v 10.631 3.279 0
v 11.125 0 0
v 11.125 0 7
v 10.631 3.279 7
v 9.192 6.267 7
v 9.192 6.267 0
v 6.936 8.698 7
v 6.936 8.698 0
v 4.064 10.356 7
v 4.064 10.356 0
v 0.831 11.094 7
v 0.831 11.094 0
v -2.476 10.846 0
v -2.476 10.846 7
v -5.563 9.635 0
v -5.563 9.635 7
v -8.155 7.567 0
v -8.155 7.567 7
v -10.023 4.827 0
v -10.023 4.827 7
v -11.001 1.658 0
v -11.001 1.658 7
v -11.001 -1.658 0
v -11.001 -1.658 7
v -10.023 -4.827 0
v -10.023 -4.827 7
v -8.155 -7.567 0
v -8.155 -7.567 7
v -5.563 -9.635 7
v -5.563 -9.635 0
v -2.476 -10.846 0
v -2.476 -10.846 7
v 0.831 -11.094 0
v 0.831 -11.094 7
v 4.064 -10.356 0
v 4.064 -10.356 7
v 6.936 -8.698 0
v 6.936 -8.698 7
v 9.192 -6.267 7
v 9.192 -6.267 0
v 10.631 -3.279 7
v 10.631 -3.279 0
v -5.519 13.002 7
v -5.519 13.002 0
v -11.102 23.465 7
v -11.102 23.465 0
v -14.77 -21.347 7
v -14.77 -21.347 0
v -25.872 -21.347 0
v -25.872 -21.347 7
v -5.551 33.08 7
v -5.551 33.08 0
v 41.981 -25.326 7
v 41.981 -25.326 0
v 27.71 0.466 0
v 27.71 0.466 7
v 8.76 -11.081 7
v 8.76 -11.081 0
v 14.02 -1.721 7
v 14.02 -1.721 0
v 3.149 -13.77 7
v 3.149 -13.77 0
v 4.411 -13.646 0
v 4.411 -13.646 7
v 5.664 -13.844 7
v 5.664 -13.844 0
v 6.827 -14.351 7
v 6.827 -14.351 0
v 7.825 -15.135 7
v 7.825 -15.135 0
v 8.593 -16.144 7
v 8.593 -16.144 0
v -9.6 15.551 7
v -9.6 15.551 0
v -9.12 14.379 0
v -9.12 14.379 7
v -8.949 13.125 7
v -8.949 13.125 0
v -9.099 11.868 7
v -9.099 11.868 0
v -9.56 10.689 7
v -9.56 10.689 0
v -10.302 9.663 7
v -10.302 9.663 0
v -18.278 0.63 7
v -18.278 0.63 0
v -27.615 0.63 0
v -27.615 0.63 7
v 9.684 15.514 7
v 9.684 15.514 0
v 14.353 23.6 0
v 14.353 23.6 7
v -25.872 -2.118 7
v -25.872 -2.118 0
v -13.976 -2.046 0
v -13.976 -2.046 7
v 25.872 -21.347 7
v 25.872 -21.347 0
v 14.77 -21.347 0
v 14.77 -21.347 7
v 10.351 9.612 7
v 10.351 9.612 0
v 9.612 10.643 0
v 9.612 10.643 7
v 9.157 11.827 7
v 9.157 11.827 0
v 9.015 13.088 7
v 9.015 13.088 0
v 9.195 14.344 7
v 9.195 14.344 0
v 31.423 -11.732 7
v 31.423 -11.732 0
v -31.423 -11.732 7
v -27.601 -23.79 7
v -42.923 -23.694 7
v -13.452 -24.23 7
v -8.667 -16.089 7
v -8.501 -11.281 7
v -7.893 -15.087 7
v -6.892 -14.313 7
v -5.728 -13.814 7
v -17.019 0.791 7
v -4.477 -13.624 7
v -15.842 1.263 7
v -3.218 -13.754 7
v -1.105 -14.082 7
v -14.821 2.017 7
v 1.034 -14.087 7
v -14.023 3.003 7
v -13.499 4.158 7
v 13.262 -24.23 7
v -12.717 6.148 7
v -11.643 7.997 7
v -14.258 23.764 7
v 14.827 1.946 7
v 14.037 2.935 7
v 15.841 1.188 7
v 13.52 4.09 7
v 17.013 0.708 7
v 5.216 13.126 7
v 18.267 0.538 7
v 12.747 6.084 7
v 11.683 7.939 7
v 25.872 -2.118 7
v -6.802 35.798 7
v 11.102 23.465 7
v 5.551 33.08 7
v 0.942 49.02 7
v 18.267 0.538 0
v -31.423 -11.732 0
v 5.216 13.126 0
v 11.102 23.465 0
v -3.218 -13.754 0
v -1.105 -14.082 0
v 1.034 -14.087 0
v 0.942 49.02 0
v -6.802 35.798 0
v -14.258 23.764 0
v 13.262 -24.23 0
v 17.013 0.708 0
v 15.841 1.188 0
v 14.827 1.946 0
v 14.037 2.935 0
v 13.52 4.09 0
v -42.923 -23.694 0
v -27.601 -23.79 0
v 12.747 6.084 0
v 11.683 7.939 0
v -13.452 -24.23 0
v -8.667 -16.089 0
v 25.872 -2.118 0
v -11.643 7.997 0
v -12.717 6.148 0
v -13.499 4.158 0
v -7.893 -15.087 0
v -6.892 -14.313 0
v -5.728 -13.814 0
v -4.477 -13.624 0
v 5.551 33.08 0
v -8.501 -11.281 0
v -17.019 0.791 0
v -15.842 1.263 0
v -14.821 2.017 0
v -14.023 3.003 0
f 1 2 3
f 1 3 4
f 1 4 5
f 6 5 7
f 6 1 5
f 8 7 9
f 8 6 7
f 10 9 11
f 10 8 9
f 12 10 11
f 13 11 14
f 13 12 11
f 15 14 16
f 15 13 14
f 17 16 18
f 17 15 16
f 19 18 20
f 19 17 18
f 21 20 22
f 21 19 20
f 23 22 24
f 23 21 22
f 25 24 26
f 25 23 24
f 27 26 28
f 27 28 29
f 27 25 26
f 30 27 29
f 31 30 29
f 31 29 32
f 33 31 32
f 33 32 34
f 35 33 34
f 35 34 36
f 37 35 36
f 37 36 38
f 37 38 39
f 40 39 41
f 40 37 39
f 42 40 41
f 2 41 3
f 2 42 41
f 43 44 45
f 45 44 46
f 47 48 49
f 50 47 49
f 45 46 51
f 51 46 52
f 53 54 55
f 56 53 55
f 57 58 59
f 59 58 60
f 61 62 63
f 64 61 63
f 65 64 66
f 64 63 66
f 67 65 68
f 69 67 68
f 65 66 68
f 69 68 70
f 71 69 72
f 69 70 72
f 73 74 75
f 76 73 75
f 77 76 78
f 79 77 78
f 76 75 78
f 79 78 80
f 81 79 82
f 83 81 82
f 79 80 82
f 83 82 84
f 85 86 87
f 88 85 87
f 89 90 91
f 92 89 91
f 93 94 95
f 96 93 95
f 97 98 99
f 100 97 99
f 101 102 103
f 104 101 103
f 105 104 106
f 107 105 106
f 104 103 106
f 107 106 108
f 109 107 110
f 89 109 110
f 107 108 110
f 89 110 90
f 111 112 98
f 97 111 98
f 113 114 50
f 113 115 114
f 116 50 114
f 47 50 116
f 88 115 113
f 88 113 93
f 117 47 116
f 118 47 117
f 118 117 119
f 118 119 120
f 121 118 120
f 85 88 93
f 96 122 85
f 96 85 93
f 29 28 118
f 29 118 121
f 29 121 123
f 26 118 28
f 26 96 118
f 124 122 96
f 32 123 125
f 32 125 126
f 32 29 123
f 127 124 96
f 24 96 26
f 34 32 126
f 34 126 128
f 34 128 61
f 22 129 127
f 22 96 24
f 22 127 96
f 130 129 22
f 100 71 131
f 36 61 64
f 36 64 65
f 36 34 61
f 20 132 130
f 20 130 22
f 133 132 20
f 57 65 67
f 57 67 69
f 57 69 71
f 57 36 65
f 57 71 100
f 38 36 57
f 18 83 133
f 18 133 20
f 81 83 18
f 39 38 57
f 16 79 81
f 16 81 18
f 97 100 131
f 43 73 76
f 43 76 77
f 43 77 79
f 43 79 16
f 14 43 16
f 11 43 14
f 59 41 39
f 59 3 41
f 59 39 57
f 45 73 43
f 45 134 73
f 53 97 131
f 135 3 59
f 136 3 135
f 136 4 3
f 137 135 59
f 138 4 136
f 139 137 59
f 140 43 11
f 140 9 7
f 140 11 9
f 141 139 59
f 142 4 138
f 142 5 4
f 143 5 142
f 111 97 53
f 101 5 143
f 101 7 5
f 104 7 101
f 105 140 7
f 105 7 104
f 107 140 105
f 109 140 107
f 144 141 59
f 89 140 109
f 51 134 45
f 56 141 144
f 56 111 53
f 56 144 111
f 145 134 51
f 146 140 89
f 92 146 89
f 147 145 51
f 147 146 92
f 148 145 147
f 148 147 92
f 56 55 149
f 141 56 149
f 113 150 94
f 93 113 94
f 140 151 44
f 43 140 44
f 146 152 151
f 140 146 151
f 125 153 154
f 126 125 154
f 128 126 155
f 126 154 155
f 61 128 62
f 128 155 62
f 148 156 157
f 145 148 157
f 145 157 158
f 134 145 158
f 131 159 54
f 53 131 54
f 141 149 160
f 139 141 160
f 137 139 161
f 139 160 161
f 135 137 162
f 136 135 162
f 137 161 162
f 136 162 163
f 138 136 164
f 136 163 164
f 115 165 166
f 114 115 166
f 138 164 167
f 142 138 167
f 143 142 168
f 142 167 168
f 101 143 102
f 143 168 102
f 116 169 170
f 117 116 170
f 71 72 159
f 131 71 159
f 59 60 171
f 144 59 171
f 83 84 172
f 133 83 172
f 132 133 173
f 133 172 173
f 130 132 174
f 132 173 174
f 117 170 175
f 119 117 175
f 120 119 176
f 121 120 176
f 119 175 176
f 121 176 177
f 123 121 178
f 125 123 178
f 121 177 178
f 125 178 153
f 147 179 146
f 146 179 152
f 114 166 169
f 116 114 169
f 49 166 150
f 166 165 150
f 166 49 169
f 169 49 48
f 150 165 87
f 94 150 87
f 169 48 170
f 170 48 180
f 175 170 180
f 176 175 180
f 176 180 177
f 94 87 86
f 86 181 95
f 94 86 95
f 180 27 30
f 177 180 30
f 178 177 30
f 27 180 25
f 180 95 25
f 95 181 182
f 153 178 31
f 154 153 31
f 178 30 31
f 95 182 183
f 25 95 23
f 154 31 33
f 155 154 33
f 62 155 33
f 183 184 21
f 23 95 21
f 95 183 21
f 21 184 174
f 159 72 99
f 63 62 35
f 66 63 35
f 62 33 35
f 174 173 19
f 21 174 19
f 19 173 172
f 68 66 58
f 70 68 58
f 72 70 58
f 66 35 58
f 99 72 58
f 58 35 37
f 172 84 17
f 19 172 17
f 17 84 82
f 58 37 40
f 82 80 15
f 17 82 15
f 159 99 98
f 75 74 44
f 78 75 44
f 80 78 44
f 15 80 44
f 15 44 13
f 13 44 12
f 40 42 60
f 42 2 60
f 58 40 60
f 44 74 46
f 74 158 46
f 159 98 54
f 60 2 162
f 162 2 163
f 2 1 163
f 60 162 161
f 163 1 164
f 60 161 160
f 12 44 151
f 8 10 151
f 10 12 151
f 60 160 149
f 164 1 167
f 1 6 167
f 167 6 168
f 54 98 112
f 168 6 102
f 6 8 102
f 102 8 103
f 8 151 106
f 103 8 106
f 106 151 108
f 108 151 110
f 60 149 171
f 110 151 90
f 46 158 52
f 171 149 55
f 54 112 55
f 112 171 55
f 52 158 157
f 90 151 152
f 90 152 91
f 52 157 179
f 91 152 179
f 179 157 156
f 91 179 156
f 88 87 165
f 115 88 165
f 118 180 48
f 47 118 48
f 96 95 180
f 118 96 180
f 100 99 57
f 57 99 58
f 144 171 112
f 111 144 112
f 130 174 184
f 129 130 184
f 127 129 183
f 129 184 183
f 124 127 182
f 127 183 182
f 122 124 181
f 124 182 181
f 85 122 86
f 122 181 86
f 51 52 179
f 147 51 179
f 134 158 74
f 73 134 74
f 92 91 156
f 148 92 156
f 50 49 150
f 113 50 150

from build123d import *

# Parameters (mm, degrees)
F0_R     = 11.125
F1_DEPTH = 7
F2_DEPTH = 7
F3_DEPTH = 7


with BuildPart() as f1:
    # F0 (on Top) → F1 (new body)
    with BuildSketch(Plane.XY):
        with BuildLine():
            Line((14.352928, 23.6), (0.942339, 49.019534))
            Line((0.942339, 49.019534), (-6.80188, 35.797903))
            Line((-6.80188, 35.797903), (-14.258011, 23.764401))
            Line((-14.258011, 23.764401), (-9.599727, 15.550613))
            ThreePointArc((-9.599727, 15.550613), (-8.984191, 12.491637), (-10.302184, 9.663366))
            ThreePointArc((-10.302184, 9.663366), (-12.214839, 7.093189), (-13.499103, 4.158105))
            ThreePointArc((-13.499103, 4.158105), (-15.307655, 1.607595), (-18.277547, 0.63))
            Line((-18.277547, 0.63), (-27.614663, 0.63))
            Line((-27.614663, 0.63), (-42.923331, -23.693677))
            Line((-42.923331, -23.693677), (-27.600953, -23.789553))
            Line((-27.600953, -23.789553), (-13.45157, -24.23))
            Line((-13.45157, -24.23), (-8.667362, -16.088915))
            ThreePointArc((-8.667362, -16.088915), (-6.325979, -14.026356), (-3.217628, -13.753636))
            ThreePointArc((-3.217628, -13.753636), (-0.035463, -14.124955), (3.148527, -13.769619))
            ThreePointArc((3.148527, -13.769619), (6.261609, -14.060615), (8.593178, -16.14382))
            Line((8.593178, -16.14382), (13.261736, -24.23))
            Line((13.261736, -24.23), (41.980992, -25.325857))
            Line((41.980992, -25.325857), (27.70958, 0.465599))
            Line((27.70958, 0.465599), (18.26709, 0.538301))
            ThreePointArc((18.26709, 0.538301), (15.31017, 1.534719), (13.519812, 4.09027))
            ThreePointArc((13.519812, 4.09027), (12.250302, 7.031766), (10.350576, 9.611514))
            ThreePointArc((10.350576, 9.611514), (9.046046, 12.45302), (9.68437, 15.51382))
            Line((9.68437, 15.51382), (14.352928, 23.6))
        make_face()
        Polygon((-31.423317, -11.732377), (-25.872195, -2.117552), (-13.976091, -2.045608), (-8.500632, -11.280731), (-14.769951, -21.347202), (-25.872195, -21.347202), align=None, mode=Mode.SUBTRACT)
        Polygon((25.872195, -21.347202), (14.769951, -21.347202), (8.759594, -11.080845), (14.019715, -1.721397), (25.872195, -2.117552), (31.423317, -11.732377), align=None, mode=Mode.SUBTRACT)
        Circle(F0_R, mode=Mode.SUBTRACT)
        Polygon((-11.102244, 23.464754), (-5.551122, 33.079579), (5.551122, 33.079579), (11.102244, 23.464754), (5.216496, 13.126454), (-5.519084, 13.002128), align=None, mode=Mode.SUBTRACT)
    extrude(amount=F1_DEPTH)

    # F0 (on Top) → F2 (join)
    with BuildSketch(Plane.XY):
        with BuildLine():
            Line((14.352928, 23.6), (0.942339, 49.019534))
            Line((0.942339, 49.019534), (-6.80188, 35.797903))
            Line((-6.80188, 35.797903), (-14.258011, 23.764401))
            Line((-14.258011, 23.764401), (-9.599727, 15.550613))
            ThreePointArc((-9.599727, 15.550613), (-8.984191, 12.491637), (-10.302184, 9.663366))
            ThreePointArc((-10.302184, 9.663366), (-12.214839, 7.093189), (-13.499103, 4.158105))
            ThreePointArc((-13.499103, 4.158105), (-15.307655, 1.607595), (-18.277547, 0.63))
            Line((-18.277547, 0.63), (-27.614663, 0.63))
            Line((-27.614663, 0.63), (-42.923331, -23.693677))
            Line((-42.923331, -23.693677), (-27.600953, -23.789553))
            Line((-27.600953, -23.789553), (-13.45157, -24.23))
            Line((-13.45157, -24.23), (-8.667362, -16.088915))
            ThreePointArc((-8.667362, -16.088915), (-6.325979, -14.026356), (-3.217628, -13.753636))
            ThreePointArc((-3.217628, -13.753636), (-0.035463, -14.124955), (3.148527, -13.769619))
            ThreePointArc((3.148527, -13.769619), (6.261609, -14.060615), (8.593178, -16.14382))
            Line((8.593178, -16.14382), (13.261736, -24.23))
            Line((13.261736, -24.23), (41.980992, -25.325857))
            Line((41.980992, -25.325857), (27.70958, 0.465599))
            Line((27.70958, 0.465599), (18.26709, 0.538301))
            ThreePointArc((18.26709, 0.538301), (15.31017, 1.534719), (13.519812, 4.09027))
            ThreePointArc((13.519812, 4.09027), (12.250302, 7.031766), (10.350576, 9.611514))
            ThreePointArc((10.350576, 9.611514), (9.046046, 12.45302), (9.68437, 15.51382))
            Line((9.68437, 15.51382), (14.352928, 23.6))
        make_face()
        Polygon((-31.423317, -11.732377), (-25.872195, -2.117552), (-13.976091, -2.045608), (-8.500632, -11.280731), (-14.769951, -21.347202), (-25.872195, -21.347202), align=None, mode=Mode.SUBTRACT)
        Polygon((25.872195, -21.347202), (14.769951, -21.347202), (8.759594, -11.080845), (14.019715, -1.721397), (25.872195, -2.117552), (31.423317, -11.732377), align=None, mode=Mode.SUBTRACT)
        Circle(F0_R, mode=Mode.SUBTRACT)
        Polygon((-11.102244, 23.464754), (-5.551122, 33.079579), (5.551122, 33.079579), (11.102244, 23.464754), (5.216496, 13.126454), (-5.519084, 13.002128), align=None, mode=Mode.SUBTRACT)
    extrude(amount=F2_DEPTH)

    # F0 (on Top) → F3 (join)
    with BuildSketch(Plane.XY):
        with BuildLine():
            Line((14.352928, 23.6), (0.942339, 49.019534))
            Line((0.942339, 49.019534), (-6.80188, 35.797903))
            Line((-6.80188, 35.797903), (-14.258011, 23.764401))
            Line((-14.258011, 23.764401), (-9.599727, 15.550613))
            ThreePointArc((-9.599727, 15.550613), (-8.984191, 12.491637), (-10.302184, 9.663366))
            ThreePointArc((-10.302184, 9.663366), (-12.214839, 7.093189), (-13.499103, 4.158105))
            ThreePointArc((-13.499103, 4.158105), (-15.307655, 1.607595), (-18.277547, 0.63))
            Line((-18.277547, 0.63), (-27.614663, 0.63))
            Line((-27.614663, 0.63), (-42.923331, -23.693677))
            Line((-42.923331, -23.693677), (-27.600953, -23.789553))
            Line((-27.600953, -23.789553), (-13.45157, -24.23))
            Line((-13.45157, -24.23), (-8.667362, -16.088915))
            ThreePointArc((-8.667362, -16.088915), (-6.325979, -14.026356), (-3.217628, -13.753636))
            ThreePointArc((-3.217628, -13.753636), (-0.035463, -14.124955), (3.148527, -13.769619))
            ThreePointArc((3.148527, -13.769619), (6.261609, -14.060615), (8.593178, -16.14382))
            Line((8.593178, -16.14382), (13.261736, -24.23))
            Line((13.261736, -24.23), (41.980992, -25.325857))
            Line((41.980992, -25.325857), (27.70958, 0.465599))
            Line((27.70958, 0.465599), (18.26709, 0.538301))
            ThreePointArc((18.26709, 0.538301), (15.31017, 1.534719), (13.519812, 4.09027))
            ThreePointArc((13.519812, 4.09027), (12.250302, 7.031766), (10.350576, 9.611514))
            ThreePointArc((10.350576, 9.611514), (9.046046, 12.45302), (9.68437, 15.51382))
            Line((9.68437, 15.51382), (14.352928, 23.6))
        make_face()
        Polygon((-31.423317, -11.732377), (-25.872195, -2.117552), (-13.976091, -2.045608), (-8.500632, -11.280731), (-14.769951, -21.347202), (-25.872195, -21.347202), align=None, mode=Mode.SUBTRACT)
        Polygon((25.872195, -21.347202), (14.769951, -21.347202), (8.759594, -11.080845), (14.019715, -1.721397), (25.872195, -2.117552), (31.423317, -11.732377), align=None, mode=Mode.SUBTRACT)
        Circle(F0_R, mode=Mode.SUBTRACT)
        Polygon((-11.102244, 23.464754), (-5.551122, 33.079579), (5.551122, 33.079579), (11.102244, 23.464754), (5.216496, 13.126454), (-5.519084, 13.002128), align=None, mode=Mode.SUBTRACT)
    extrude(amount=F3_DEPTH)


solid = f1.part
